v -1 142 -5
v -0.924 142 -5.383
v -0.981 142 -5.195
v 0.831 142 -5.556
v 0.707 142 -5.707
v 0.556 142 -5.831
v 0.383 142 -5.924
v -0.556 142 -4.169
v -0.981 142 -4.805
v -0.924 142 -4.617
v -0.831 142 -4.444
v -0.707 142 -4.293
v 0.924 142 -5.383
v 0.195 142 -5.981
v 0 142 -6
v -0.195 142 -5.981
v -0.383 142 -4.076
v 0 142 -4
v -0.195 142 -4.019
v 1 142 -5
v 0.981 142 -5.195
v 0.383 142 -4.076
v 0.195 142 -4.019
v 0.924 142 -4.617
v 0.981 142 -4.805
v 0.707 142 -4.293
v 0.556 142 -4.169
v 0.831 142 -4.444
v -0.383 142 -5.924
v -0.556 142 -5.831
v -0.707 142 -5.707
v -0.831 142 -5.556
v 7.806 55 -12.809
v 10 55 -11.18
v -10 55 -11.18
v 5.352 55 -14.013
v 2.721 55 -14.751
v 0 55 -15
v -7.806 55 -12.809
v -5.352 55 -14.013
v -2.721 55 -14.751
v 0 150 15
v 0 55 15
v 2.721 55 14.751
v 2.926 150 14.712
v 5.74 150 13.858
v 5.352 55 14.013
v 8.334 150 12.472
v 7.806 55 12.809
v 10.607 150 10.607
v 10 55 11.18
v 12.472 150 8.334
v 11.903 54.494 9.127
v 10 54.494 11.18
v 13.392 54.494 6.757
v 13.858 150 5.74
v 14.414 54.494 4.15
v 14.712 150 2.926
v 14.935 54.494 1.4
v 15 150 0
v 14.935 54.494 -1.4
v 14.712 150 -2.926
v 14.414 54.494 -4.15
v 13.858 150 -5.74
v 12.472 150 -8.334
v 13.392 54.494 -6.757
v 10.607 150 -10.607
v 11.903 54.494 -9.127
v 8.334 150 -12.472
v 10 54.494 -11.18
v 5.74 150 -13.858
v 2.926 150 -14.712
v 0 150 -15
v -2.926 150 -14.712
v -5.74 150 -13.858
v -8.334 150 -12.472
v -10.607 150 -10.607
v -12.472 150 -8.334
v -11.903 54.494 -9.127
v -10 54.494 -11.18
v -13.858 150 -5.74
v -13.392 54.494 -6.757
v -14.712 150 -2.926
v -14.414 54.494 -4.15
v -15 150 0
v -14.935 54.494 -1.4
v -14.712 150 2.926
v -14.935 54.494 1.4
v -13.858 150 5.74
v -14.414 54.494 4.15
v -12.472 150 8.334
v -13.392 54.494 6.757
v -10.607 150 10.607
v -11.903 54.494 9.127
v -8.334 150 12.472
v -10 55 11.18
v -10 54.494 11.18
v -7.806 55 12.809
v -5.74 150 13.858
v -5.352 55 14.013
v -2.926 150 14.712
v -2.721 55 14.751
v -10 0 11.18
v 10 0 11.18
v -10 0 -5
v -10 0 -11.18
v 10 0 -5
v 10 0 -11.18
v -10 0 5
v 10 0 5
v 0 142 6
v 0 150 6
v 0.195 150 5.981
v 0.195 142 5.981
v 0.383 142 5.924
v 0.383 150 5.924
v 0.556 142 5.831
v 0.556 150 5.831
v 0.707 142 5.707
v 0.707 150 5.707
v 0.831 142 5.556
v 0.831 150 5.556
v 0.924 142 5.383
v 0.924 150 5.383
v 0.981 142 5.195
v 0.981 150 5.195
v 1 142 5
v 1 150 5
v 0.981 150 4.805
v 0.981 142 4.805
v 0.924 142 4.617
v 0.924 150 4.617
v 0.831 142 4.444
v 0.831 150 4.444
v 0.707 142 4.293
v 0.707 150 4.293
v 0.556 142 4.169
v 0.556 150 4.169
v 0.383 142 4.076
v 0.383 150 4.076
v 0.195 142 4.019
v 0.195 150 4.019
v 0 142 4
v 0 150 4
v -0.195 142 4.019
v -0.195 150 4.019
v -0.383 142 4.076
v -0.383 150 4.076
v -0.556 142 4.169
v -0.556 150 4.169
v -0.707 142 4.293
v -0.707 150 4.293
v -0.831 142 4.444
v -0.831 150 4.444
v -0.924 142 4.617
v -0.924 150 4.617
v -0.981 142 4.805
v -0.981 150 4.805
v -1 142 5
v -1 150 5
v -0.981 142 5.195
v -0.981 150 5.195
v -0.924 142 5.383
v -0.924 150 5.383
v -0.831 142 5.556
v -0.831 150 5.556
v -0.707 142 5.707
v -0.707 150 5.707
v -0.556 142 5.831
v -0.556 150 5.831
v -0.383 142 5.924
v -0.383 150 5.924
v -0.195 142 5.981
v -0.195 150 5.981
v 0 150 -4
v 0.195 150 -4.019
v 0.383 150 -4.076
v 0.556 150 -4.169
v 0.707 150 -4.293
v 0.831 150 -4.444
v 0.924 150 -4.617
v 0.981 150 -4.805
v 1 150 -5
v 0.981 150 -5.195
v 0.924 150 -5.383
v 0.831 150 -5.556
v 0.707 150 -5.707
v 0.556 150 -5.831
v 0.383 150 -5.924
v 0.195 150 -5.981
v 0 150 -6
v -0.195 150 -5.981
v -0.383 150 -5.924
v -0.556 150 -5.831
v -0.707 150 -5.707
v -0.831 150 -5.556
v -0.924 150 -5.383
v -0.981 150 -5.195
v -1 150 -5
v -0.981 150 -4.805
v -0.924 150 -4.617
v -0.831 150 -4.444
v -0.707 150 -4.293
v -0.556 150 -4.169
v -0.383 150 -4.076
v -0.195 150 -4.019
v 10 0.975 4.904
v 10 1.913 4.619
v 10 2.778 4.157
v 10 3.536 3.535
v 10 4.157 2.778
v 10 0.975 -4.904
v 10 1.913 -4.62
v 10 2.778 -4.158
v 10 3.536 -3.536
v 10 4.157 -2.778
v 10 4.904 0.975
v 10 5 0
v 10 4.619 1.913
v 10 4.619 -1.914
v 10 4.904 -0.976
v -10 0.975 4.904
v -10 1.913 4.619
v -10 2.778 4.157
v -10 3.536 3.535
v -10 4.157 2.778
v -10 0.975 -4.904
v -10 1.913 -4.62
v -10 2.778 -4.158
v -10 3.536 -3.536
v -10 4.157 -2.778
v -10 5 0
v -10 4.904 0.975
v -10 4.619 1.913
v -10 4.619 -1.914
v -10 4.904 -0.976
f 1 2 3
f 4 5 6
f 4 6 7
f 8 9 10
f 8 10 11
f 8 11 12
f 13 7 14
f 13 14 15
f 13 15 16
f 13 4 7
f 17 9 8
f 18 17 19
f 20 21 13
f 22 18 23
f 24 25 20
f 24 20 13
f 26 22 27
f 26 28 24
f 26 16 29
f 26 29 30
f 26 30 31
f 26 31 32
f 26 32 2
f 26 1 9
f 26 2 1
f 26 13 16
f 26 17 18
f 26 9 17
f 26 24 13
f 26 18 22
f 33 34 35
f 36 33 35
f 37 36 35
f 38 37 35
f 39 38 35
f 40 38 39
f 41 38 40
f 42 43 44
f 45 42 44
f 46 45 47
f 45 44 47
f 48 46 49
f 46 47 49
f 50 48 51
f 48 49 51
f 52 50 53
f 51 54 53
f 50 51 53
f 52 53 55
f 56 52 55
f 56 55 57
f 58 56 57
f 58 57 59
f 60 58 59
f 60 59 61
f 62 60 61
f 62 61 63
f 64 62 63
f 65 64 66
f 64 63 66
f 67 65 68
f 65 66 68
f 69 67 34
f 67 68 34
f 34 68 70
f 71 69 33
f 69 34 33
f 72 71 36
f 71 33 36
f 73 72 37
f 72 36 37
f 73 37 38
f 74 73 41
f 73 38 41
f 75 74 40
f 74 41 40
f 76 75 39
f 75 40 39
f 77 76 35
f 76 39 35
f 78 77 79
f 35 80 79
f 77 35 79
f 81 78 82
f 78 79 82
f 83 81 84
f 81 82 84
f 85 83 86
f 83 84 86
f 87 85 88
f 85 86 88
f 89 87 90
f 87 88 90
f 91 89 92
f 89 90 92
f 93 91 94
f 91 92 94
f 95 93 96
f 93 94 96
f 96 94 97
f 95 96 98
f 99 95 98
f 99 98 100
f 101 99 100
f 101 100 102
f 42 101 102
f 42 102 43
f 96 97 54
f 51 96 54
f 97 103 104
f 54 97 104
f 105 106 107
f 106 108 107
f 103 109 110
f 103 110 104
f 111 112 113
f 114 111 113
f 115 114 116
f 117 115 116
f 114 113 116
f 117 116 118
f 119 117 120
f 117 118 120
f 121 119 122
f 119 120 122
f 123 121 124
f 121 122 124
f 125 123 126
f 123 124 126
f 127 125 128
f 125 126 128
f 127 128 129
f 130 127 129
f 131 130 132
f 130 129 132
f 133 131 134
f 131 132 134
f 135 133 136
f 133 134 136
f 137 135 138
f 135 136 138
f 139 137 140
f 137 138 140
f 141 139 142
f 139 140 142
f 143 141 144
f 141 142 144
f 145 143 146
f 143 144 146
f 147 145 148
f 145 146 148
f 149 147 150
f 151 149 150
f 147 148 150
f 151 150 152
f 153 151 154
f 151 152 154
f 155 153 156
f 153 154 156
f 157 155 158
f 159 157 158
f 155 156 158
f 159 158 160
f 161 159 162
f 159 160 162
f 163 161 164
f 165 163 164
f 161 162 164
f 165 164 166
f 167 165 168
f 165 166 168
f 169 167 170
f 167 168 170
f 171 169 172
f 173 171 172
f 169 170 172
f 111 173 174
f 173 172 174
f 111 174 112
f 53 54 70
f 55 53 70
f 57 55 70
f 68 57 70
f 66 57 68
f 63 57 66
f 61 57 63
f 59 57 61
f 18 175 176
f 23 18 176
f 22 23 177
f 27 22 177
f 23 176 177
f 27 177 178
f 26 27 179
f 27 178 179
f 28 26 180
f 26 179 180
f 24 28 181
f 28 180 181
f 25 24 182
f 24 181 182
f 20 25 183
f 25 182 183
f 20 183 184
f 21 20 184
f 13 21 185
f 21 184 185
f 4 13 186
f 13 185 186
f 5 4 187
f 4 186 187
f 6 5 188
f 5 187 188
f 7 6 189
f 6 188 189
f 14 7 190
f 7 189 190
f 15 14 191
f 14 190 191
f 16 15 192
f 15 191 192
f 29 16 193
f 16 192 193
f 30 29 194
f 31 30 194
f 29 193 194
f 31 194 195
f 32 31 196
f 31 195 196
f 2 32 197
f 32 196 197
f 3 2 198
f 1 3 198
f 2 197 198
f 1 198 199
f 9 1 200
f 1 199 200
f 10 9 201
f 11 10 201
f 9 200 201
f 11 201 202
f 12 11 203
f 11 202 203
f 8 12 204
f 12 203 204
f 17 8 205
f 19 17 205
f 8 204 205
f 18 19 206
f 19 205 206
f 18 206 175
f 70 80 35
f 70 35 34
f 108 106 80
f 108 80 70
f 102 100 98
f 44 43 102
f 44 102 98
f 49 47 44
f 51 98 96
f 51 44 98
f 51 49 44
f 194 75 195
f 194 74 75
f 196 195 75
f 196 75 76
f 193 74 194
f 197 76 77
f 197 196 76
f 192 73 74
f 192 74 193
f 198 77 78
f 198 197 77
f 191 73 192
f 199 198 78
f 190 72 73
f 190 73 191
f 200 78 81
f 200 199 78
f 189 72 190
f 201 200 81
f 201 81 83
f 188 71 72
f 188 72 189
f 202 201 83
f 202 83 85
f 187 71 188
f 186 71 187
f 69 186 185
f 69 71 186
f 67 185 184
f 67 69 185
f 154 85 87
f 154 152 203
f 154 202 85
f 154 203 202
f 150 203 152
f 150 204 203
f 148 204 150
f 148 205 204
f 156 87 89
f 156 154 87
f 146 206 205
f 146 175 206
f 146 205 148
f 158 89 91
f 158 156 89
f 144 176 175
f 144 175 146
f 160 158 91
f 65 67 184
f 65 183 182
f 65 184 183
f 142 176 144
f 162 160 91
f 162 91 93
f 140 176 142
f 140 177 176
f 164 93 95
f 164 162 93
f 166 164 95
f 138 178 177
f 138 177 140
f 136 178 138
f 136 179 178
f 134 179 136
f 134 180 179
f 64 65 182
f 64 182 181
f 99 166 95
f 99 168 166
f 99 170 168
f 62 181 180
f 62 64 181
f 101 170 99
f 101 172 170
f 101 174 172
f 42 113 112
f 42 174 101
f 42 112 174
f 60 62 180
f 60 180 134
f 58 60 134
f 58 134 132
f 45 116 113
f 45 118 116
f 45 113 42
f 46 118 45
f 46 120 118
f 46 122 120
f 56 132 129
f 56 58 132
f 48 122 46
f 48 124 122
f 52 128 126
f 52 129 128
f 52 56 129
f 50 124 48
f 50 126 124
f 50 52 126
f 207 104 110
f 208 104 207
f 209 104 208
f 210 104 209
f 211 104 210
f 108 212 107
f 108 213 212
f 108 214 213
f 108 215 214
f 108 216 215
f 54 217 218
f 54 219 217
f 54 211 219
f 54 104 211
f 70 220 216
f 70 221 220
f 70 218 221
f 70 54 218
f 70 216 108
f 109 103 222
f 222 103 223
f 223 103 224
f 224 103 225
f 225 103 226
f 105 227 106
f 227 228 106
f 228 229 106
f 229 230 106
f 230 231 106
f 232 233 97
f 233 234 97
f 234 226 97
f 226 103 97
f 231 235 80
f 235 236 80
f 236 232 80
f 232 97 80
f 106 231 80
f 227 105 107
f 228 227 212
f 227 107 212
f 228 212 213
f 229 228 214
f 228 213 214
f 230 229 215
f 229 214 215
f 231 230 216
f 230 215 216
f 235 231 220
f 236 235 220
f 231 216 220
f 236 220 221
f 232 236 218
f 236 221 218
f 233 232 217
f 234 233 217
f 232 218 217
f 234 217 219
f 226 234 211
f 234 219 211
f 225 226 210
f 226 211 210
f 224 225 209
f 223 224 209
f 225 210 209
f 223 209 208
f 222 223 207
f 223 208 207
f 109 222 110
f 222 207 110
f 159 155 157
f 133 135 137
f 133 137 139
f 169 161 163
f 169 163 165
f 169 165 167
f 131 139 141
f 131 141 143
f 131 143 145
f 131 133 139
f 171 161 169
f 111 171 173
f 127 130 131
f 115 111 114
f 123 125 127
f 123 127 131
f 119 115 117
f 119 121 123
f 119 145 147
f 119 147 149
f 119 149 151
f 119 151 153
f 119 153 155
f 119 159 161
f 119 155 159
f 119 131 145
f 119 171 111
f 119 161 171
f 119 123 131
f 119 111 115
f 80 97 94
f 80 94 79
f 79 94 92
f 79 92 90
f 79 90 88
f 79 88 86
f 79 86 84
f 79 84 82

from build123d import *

# Parameters (mm, degrees)
SKETCH2_R           = 15
BOSS_EXTRUDE1_DEPTH = 150
CUT_EXTRUDE1_START  = 10
SKETCH3_W           = 30
SKETCH3_H           = 108.98871412
CUT_EXTRUDE1_DEPTH  = 100
CUT_EXTRUDE2_START  = -10
SKETCH3_2_W         = 30
SKETCH3_2_H         = 108.98871412
CUT_EXTRUDE2_DEPTH  = 100
CUT_EXTRUDE4_DEPTH  = 55
SKETCH4_R           = 5
CUT_EXTRUDE5_DEPTH  = 153.807067899
SKETCH6_R           = 1
CUT_EXTRUDE6_DEPTH  = 8


with BuildPart() as part:
    # Sketch2 → Boss-Extrude1 (new body)
    with BuildSketch(Plane(origin=(0, 0, 0), x_dir=(1, 0, 0), z_dir=(0, 1, 0))):
        Circle(SKETCH2_R)
    extrude(amount=BOSS_EXTRUDE1_DEPTH)

    # Sketch3 → Cut-Extrude1 (cut)
    with BuildSketch(Plane(origin=(0, 0, 0), x_dir=(0, 0, -1), z_dir=(1, 0, 0)).offset(CUT_EXTRUDE1_START)):
        Rectangle(SKETCH3_W, SKETCH3_H)
    extrude(amount=CUT_EXTRUDE1_DEPTH, mode=Mode.SUBTRACT)

    # Sketch3<2> → Cut-Extrude2 (cut)
    with BuildSketch(Plane(origin=(0, 0, 0), x_dir=(0, 0, -1), z_dir=(1, 0, 0)).offset(CUT_EXTRUDE2_START)):
        Rectangle(SKETCH3_2_W, SKETCH3_2_H)
    extrude(amount=-CUT_EXTRUDE2_DEPTH, mode=Mode.SUBTRACT)

    # Sketch5 → Cut-Extrude4 (cut)
    with BuildSketch(Plane.XZ):
        with BuildLine():
            Line((-10, 11.180339887), (10, 11.180339887))
            ThreePointArc((10, 11.180339887), (0, 15), (-10, 11.180339887))
        make_face()
        with BuildLine():
            Line((-10, -11.180339887), (10, -11.180339887))
            ThreePointArc((10, -11.180339887), (0, -15), (-10, -11.180339887))
        make_face()
    extrude(amount=-CUT_EXTRUDE4_DEPTH, mode=Mode.SUBTRACT)

    # Sketch4 → Cut-Extrude5 (cut, through all)
    with BuildSketch(Plane(origin=(10, 0, 0), x_dir=(0, 0, -1), z_dir=(1, 0, 0))):
        with Locations((0.000339887, 0)):
            Circle(SKETCH4_R)
    extrude(amount=-CUT_EXTRUDE5_DEPTH, mode=Mode.SUBTRACT)

    # Sketch6 → Cut-Extrude6 (cut)
    with BuildSketch(Plane(origin=(0, 150, 0), x_dir=(1, 0, 0), z_dir=(0, 1, 0))):
        with Locations((0, 5)):
            Circle(SKETCH6_R)
        with Locations((0, -5)):
            Circle(SKETCH6_R)
    extrude(amount=-CUT_EXTRUDE6_DEPTH, mode=Mode.SUBTRACT)


solid = part.part
